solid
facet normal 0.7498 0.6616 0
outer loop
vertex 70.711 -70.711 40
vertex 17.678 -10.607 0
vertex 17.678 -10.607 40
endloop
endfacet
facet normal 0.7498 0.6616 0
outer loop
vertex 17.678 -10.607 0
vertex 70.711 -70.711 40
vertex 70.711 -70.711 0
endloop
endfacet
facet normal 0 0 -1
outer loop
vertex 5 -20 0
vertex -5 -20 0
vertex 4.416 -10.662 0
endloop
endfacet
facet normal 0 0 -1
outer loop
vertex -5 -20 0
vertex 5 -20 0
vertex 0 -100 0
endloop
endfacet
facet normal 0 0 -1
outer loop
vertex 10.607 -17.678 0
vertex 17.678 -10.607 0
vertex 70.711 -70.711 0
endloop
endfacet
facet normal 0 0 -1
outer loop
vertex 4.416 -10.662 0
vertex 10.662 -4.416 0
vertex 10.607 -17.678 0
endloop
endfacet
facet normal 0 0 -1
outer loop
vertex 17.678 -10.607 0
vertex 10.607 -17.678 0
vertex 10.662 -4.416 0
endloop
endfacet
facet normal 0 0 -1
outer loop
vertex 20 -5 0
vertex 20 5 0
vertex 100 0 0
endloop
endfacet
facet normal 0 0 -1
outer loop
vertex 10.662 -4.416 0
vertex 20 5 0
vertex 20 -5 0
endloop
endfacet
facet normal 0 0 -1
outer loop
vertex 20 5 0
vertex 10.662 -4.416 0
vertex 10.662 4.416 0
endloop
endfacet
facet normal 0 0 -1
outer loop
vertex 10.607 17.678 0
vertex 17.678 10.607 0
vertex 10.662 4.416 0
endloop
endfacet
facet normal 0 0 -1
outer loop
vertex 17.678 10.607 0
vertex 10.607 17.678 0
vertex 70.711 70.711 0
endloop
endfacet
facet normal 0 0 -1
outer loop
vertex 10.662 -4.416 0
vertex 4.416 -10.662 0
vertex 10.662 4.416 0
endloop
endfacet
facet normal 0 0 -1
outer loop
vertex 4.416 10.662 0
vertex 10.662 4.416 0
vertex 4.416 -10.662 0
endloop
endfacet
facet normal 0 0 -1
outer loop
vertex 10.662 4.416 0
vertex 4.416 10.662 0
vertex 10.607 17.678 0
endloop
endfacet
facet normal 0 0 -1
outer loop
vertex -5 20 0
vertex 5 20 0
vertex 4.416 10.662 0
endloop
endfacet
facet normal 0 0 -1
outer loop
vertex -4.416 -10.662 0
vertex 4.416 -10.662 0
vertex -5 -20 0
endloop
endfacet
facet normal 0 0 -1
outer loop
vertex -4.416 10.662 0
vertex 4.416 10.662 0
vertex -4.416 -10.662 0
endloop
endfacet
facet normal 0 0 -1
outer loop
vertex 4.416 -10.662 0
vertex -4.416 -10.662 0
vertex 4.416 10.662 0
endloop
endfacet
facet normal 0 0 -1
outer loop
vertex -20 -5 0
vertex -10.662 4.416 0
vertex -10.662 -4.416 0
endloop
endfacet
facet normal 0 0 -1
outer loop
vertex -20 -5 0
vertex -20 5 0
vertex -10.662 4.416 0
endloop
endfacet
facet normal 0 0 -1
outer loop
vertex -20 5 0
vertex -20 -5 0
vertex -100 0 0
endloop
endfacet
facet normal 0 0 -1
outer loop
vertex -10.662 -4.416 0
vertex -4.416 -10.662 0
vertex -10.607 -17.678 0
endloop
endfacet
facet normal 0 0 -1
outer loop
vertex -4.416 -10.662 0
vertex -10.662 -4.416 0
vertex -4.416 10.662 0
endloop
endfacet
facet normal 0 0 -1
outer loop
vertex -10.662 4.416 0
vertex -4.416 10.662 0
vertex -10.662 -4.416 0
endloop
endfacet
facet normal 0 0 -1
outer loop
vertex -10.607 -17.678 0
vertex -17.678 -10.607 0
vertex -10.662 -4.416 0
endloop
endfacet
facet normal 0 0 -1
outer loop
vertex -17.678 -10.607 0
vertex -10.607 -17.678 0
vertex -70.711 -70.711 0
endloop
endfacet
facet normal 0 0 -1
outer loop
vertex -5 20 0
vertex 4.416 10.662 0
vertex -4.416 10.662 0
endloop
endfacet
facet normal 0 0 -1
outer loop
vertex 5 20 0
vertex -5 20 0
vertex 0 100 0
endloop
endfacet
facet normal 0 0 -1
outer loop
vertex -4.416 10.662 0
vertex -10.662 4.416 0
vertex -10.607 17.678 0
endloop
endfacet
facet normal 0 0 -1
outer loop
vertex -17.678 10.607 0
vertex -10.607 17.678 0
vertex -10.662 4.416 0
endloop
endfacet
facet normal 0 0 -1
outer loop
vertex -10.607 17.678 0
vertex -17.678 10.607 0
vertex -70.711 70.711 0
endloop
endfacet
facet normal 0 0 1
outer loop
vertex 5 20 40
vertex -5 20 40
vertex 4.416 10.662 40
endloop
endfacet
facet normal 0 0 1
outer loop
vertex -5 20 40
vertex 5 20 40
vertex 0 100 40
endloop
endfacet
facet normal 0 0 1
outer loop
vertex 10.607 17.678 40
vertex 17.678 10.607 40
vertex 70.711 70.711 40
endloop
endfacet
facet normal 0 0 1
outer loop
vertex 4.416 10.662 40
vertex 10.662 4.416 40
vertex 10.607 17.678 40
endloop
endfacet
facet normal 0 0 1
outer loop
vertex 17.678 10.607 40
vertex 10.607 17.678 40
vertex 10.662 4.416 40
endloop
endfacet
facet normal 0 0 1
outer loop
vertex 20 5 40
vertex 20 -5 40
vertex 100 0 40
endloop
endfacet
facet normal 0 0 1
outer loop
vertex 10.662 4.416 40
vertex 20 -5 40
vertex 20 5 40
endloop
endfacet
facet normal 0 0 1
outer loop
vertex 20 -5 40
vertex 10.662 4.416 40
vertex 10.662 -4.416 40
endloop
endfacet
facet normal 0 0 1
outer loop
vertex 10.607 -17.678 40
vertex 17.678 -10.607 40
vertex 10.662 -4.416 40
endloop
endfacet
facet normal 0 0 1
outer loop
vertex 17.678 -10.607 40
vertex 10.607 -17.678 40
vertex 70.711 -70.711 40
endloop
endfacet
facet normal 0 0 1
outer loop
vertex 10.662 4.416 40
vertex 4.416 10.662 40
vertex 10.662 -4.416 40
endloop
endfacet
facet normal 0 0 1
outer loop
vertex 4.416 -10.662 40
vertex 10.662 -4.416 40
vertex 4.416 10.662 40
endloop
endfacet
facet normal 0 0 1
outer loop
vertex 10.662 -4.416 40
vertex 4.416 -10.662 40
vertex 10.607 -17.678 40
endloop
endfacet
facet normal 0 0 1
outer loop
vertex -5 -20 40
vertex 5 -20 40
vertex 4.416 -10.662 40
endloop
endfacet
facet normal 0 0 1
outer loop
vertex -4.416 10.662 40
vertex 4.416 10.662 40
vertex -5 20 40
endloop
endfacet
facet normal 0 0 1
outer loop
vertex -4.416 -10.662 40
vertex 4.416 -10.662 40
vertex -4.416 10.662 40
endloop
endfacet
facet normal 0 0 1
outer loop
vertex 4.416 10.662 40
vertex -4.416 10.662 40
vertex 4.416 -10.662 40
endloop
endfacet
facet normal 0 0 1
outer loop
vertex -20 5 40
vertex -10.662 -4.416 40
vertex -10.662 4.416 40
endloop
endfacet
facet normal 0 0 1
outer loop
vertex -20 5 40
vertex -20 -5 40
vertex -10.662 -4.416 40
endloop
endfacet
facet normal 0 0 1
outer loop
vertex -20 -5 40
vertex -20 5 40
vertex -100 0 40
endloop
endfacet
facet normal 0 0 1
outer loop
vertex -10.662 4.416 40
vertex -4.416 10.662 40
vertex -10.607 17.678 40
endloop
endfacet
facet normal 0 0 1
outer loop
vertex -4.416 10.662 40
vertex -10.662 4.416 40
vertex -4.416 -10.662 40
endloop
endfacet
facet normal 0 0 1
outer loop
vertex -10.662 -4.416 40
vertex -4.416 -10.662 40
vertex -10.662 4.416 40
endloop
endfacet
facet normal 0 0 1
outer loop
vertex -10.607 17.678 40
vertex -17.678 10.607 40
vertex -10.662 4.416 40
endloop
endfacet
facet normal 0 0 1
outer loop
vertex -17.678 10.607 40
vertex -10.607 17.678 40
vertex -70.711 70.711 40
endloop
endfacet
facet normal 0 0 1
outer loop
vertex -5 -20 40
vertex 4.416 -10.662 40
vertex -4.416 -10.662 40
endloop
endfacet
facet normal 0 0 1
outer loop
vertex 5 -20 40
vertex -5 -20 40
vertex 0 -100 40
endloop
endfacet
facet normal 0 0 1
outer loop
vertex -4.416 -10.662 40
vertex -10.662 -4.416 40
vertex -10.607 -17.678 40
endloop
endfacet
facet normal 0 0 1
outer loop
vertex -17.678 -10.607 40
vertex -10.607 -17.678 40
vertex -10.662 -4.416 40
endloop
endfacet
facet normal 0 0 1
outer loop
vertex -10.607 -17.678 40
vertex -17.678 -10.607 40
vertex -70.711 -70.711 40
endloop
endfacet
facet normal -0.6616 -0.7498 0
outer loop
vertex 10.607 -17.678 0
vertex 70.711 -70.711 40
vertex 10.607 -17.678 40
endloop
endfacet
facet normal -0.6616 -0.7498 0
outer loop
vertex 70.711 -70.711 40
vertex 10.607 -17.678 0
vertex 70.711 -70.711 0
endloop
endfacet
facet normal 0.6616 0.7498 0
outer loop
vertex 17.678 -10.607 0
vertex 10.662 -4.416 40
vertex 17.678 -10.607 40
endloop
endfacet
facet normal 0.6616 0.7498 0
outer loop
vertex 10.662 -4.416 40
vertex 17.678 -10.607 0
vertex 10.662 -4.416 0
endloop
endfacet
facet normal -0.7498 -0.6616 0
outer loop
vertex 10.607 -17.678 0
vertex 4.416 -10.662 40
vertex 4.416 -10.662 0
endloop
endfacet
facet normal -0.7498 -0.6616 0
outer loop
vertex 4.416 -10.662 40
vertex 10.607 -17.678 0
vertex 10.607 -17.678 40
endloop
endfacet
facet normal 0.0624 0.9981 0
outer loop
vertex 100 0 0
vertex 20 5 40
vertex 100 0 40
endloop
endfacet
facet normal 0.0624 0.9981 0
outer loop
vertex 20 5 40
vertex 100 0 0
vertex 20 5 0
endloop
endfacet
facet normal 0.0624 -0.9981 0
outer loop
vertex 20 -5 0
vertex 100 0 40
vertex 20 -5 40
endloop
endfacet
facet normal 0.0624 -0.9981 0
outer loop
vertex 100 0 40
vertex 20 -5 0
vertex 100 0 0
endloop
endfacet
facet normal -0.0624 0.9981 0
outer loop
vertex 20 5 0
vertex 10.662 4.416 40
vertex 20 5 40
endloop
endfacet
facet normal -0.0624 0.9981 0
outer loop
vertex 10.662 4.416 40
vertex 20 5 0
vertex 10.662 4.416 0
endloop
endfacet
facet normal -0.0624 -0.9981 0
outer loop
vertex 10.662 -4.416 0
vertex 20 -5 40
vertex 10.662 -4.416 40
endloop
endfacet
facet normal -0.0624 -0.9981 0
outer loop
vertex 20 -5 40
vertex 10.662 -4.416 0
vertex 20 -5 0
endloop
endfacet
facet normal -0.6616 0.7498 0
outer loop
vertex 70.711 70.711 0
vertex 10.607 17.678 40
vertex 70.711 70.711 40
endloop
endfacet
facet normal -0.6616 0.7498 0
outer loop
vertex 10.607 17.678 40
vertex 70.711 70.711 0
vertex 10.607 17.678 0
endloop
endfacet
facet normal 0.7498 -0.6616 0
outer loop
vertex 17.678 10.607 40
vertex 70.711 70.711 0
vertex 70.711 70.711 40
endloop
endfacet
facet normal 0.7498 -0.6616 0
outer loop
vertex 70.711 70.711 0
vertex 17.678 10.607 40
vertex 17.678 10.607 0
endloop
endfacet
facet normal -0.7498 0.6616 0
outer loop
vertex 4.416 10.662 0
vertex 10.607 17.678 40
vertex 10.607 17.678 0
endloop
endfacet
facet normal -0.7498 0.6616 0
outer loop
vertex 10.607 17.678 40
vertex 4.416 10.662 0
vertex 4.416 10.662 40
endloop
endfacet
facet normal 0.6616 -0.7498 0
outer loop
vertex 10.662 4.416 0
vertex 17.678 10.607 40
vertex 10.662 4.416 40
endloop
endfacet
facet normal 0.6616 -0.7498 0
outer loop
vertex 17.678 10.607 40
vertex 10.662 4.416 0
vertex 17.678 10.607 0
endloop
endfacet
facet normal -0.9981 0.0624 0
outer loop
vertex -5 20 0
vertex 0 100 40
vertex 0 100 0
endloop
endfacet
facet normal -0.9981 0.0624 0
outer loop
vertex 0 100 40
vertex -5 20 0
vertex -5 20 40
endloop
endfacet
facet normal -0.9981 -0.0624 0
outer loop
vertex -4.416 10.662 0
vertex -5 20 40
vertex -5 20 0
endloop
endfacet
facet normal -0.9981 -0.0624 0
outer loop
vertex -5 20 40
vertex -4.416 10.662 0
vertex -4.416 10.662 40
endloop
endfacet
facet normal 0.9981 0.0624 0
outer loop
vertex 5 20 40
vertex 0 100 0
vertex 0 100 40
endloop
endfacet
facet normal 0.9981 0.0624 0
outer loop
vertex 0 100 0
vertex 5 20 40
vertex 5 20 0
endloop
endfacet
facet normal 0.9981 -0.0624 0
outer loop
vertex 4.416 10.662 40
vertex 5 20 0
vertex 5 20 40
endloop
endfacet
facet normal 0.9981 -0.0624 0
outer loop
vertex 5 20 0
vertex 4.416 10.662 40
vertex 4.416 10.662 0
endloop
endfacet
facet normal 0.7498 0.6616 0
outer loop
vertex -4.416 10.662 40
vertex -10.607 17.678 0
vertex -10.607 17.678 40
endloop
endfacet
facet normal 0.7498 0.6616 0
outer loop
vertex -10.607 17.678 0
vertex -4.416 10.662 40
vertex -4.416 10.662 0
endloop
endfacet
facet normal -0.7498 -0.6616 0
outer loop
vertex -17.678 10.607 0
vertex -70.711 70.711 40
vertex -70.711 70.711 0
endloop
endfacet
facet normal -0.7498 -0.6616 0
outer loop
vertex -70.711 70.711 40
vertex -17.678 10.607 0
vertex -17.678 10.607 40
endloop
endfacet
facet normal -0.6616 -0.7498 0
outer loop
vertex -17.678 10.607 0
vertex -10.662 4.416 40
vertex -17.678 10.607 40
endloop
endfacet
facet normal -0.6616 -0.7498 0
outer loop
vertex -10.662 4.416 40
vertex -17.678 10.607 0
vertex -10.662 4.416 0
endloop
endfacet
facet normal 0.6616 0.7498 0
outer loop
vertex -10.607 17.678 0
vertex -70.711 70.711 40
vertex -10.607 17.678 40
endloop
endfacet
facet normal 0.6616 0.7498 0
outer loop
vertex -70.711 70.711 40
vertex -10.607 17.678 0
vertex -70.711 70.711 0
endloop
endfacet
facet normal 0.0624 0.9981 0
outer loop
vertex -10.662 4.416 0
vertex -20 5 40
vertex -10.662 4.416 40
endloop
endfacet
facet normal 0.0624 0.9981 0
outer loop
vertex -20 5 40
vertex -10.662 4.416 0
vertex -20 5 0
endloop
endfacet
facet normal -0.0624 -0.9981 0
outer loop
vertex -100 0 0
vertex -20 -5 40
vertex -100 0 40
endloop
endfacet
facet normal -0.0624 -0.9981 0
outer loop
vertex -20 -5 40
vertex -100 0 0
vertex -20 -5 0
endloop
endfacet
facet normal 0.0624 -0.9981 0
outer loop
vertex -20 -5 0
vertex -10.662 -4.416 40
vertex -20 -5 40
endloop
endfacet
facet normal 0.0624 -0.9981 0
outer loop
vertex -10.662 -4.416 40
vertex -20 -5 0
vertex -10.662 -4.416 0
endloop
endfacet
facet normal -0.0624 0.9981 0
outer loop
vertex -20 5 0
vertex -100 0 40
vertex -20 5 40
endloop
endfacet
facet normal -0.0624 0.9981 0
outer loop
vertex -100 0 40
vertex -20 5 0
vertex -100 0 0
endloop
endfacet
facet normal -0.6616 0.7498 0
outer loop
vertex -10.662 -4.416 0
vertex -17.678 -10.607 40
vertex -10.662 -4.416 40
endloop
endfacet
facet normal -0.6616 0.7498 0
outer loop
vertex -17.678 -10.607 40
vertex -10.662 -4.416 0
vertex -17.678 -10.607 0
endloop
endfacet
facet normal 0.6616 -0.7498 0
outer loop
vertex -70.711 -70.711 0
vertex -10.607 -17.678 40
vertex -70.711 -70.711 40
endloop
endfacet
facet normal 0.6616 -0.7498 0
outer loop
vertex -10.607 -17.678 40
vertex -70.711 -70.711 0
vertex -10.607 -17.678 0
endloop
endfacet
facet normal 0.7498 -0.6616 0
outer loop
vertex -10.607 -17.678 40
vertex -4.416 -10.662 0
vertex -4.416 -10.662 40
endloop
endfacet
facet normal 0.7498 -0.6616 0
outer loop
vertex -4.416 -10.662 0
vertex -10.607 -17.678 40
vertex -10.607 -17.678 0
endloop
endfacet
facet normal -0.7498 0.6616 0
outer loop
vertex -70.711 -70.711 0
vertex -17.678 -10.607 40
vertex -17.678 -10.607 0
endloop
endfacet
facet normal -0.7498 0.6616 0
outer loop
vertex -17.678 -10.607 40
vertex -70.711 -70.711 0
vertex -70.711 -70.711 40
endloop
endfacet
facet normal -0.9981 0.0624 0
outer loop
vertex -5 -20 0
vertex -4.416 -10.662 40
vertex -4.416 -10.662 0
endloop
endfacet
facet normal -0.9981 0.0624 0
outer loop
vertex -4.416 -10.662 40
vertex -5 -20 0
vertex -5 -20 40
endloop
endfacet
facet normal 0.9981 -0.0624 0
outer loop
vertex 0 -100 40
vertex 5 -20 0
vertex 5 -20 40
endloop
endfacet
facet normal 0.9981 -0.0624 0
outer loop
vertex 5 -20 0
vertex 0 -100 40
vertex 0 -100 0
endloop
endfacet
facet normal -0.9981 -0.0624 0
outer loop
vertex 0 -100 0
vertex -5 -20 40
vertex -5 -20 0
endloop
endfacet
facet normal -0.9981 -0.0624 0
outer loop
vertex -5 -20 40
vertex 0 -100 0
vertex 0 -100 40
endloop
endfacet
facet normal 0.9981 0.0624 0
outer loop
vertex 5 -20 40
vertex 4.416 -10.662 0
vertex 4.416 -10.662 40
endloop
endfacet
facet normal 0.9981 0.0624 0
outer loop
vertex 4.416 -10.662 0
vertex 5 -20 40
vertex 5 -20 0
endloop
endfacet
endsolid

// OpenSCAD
// Flower Parameters
petalCount = 8;          // Number of petals
petalLength = 40;        // Length of each petal
petalWidth = 10;         // Width of each petal
petalRotation = 45;      // Rotation angle for the petals
centerRadius = 8;        // Radius of the center of the flower

// Generate Petal Shape
module petal() {
    rotate([0, 0, petalRotation])
    translate([0, petalLength/2, 0])
    scale([1, 2, 1])
    rotate([0, 0, 180])
    translate([0, -petalLength/2, 0])
    linear_extrude(height=petalLength)
    polygon(points=[[0, 0], [petalWidth/2, petalLength], [0, petalLength*2], [-petalWidth/2, petalLength]], paths=[[0, 1, 2, 3]]);
}

// Generate Flower
module flower() {
    for (i = [0:petalCount-1]) {
        rotate([0, 0, 360*i/petalCount])
        petal();
    }
    cylinder(h=petalLength, r=centerRadius, $fn=6); // Flower center
}

// Render Flower
flower();
